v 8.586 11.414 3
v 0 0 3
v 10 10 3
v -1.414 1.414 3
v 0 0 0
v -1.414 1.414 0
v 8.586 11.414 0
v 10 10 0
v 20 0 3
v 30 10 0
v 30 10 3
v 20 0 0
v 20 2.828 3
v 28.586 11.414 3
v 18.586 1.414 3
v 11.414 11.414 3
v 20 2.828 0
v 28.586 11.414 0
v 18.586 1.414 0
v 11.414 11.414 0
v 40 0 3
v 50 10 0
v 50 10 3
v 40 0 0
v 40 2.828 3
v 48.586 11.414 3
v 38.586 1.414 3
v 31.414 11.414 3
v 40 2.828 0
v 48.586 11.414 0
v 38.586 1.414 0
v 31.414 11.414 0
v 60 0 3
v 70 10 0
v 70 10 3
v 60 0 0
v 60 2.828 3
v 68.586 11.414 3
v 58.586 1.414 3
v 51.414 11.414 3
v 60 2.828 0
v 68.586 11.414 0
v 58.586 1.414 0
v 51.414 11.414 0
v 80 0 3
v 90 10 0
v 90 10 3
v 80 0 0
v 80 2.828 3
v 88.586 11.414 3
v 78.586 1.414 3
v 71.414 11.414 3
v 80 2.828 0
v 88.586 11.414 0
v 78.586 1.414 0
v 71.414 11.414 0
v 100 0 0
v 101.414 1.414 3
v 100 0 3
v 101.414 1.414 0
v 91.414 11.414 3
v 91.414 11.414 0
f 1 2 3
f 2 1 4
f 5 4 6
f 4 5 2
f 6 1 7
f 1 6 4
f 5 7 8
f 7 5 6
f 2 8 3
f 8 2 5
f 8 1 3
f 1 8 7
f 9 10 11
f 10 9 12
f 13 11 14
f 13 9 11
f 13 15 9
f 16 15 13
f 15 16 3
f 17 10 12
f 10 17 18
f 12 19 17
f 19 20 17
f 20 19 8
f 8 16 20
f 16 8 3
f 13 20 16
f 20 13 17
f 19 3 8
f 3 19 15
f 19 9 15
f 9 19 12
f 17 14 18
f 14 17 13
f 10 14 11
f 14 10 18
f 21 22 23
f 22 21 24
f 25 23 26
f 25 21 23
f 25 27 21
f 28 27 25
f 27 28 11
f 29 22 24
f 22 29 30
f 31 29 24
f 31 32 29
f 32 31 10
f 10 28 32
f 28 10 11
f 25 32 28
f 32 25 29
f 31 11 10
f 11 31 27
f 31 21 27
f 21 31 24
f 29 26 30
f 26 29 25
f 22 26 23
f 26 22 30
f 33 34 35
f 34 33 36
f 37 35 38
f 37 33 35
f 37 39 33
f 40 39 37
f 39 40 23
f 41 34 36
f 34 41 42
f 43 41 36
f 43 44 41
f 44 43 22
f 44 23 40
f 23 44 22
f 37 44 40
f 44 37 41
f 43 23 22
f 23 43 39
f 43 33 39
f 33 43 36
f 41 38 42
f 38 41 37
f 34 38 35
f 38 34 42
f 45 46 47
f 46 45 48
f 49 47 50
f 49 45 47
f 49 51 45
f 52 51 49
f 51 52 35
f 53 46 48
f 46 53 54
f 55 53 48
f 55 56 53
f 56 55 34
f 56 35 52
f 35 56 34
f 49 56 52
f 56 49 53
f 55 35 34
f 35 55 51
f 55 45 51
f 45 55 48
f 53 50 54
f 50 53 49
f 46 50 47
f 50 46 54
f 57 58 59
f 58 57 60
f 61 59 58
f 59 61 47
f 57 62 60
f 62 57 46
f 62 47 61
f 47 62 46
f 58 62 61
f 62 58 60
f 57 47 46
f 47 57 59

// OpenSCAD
union() {
  translate([-7.0710678118654755, 0, 0]) {
    translate([0, 0.0, 0]) {
      translate([7.0710678118654755, 0, 0]) {
        rotate([0, 0, 45.0]) {
          cube([14.142135623730951, 2.0, 3.0]);
        }
      }
    }
  }
  translate([2.9289321881345263, 0, 0]) {
    translate([0, 10.0, 0]) {
      translate([7.0710678118654755, 0, 0]) {
        rotate([0, 0, -45.0]) {
          cube([14.142135623730951, 2.0, 3.0]);
        }
      }
    }
  }
  translate([12.928932188134528, 0, 0]) {
    translate([0, 0.0, 0]) {
      translate([7.0710678118654755, 0, 0]) {
        rotate([0, 0, 45.0]) {
          cube([14.142135623730951, 2.0, 3.0]);
        }
      }
    }
  }
  translate([22.92893218813453, 0, 0]) {
    translate([0, 10.0, 0]) {
      translate([7.0710678118654755, 0, 0]) {
        rotate([0, 0, -45.0]) {
          cube([14.142135623730951, 2.0, 3.0]);
        }
      }
    }
  }
  translate([32.92893218813453, 0, 0]) {
    translate([0, 0.0, 0]) {
      translate([7.0710678118654755, 0, 0]) {
        rotate([0, 0, 45.0]) {
          cube([14.142135623730951, 2.0, 3.0]);
        }
      }
    }
  }
  translate([42.92893218813453, 0, 0]) {
    translate([0, 10.0, 0]) {
      translate([7.0710678118654755, 0, 0]) {
        rotate([0, 0, -45.0]) {
          cube([14.142135623730951, 2.0, 3.0]);
        }
      }
    }
  }
  translate([52.92893218813454, 0, 0]) {
    translate([0, 0.0, 0]) {
      translate([7.0710678118654755, 0, 0]) {
        rotate([0, 0, 45.0]) {
          cube([14.142135623730951, 2.0, 3.0]);
        }
      }
    }
  }
  translate([62.92893218813454, 0, 0]) {
    translate([0, 10.0, 0]) {
      translate([7.0710678118654755, 0, 0]) {
        rotate([0, 0, -45.0]) {
          cube([14.142135623730951, 2.0, 3.0]);
        }
      }
    }
  }
  translate([72.92893218813454, 0, 0]) {
    translate([0, 0.0, 0]) {
      translate([7.0710678118654755, 0, 0]) {
        rotate([0, 0, 45.0]) {
          cube([14.142135623730951, 2.0, 3.0]);
        }
      }
    }
  }
  translate([82.92893218813454, 0, 0]) {
    translate([0, 10.0, 0]) {
      translate([7.0710678118654755, 0, 0]) {
        rotate([0, 0, -45.0]) {
          cube([14.142135623730951, 2.0, 3.0]);
        }
      }
    }
  }
}
$fn = 50;
